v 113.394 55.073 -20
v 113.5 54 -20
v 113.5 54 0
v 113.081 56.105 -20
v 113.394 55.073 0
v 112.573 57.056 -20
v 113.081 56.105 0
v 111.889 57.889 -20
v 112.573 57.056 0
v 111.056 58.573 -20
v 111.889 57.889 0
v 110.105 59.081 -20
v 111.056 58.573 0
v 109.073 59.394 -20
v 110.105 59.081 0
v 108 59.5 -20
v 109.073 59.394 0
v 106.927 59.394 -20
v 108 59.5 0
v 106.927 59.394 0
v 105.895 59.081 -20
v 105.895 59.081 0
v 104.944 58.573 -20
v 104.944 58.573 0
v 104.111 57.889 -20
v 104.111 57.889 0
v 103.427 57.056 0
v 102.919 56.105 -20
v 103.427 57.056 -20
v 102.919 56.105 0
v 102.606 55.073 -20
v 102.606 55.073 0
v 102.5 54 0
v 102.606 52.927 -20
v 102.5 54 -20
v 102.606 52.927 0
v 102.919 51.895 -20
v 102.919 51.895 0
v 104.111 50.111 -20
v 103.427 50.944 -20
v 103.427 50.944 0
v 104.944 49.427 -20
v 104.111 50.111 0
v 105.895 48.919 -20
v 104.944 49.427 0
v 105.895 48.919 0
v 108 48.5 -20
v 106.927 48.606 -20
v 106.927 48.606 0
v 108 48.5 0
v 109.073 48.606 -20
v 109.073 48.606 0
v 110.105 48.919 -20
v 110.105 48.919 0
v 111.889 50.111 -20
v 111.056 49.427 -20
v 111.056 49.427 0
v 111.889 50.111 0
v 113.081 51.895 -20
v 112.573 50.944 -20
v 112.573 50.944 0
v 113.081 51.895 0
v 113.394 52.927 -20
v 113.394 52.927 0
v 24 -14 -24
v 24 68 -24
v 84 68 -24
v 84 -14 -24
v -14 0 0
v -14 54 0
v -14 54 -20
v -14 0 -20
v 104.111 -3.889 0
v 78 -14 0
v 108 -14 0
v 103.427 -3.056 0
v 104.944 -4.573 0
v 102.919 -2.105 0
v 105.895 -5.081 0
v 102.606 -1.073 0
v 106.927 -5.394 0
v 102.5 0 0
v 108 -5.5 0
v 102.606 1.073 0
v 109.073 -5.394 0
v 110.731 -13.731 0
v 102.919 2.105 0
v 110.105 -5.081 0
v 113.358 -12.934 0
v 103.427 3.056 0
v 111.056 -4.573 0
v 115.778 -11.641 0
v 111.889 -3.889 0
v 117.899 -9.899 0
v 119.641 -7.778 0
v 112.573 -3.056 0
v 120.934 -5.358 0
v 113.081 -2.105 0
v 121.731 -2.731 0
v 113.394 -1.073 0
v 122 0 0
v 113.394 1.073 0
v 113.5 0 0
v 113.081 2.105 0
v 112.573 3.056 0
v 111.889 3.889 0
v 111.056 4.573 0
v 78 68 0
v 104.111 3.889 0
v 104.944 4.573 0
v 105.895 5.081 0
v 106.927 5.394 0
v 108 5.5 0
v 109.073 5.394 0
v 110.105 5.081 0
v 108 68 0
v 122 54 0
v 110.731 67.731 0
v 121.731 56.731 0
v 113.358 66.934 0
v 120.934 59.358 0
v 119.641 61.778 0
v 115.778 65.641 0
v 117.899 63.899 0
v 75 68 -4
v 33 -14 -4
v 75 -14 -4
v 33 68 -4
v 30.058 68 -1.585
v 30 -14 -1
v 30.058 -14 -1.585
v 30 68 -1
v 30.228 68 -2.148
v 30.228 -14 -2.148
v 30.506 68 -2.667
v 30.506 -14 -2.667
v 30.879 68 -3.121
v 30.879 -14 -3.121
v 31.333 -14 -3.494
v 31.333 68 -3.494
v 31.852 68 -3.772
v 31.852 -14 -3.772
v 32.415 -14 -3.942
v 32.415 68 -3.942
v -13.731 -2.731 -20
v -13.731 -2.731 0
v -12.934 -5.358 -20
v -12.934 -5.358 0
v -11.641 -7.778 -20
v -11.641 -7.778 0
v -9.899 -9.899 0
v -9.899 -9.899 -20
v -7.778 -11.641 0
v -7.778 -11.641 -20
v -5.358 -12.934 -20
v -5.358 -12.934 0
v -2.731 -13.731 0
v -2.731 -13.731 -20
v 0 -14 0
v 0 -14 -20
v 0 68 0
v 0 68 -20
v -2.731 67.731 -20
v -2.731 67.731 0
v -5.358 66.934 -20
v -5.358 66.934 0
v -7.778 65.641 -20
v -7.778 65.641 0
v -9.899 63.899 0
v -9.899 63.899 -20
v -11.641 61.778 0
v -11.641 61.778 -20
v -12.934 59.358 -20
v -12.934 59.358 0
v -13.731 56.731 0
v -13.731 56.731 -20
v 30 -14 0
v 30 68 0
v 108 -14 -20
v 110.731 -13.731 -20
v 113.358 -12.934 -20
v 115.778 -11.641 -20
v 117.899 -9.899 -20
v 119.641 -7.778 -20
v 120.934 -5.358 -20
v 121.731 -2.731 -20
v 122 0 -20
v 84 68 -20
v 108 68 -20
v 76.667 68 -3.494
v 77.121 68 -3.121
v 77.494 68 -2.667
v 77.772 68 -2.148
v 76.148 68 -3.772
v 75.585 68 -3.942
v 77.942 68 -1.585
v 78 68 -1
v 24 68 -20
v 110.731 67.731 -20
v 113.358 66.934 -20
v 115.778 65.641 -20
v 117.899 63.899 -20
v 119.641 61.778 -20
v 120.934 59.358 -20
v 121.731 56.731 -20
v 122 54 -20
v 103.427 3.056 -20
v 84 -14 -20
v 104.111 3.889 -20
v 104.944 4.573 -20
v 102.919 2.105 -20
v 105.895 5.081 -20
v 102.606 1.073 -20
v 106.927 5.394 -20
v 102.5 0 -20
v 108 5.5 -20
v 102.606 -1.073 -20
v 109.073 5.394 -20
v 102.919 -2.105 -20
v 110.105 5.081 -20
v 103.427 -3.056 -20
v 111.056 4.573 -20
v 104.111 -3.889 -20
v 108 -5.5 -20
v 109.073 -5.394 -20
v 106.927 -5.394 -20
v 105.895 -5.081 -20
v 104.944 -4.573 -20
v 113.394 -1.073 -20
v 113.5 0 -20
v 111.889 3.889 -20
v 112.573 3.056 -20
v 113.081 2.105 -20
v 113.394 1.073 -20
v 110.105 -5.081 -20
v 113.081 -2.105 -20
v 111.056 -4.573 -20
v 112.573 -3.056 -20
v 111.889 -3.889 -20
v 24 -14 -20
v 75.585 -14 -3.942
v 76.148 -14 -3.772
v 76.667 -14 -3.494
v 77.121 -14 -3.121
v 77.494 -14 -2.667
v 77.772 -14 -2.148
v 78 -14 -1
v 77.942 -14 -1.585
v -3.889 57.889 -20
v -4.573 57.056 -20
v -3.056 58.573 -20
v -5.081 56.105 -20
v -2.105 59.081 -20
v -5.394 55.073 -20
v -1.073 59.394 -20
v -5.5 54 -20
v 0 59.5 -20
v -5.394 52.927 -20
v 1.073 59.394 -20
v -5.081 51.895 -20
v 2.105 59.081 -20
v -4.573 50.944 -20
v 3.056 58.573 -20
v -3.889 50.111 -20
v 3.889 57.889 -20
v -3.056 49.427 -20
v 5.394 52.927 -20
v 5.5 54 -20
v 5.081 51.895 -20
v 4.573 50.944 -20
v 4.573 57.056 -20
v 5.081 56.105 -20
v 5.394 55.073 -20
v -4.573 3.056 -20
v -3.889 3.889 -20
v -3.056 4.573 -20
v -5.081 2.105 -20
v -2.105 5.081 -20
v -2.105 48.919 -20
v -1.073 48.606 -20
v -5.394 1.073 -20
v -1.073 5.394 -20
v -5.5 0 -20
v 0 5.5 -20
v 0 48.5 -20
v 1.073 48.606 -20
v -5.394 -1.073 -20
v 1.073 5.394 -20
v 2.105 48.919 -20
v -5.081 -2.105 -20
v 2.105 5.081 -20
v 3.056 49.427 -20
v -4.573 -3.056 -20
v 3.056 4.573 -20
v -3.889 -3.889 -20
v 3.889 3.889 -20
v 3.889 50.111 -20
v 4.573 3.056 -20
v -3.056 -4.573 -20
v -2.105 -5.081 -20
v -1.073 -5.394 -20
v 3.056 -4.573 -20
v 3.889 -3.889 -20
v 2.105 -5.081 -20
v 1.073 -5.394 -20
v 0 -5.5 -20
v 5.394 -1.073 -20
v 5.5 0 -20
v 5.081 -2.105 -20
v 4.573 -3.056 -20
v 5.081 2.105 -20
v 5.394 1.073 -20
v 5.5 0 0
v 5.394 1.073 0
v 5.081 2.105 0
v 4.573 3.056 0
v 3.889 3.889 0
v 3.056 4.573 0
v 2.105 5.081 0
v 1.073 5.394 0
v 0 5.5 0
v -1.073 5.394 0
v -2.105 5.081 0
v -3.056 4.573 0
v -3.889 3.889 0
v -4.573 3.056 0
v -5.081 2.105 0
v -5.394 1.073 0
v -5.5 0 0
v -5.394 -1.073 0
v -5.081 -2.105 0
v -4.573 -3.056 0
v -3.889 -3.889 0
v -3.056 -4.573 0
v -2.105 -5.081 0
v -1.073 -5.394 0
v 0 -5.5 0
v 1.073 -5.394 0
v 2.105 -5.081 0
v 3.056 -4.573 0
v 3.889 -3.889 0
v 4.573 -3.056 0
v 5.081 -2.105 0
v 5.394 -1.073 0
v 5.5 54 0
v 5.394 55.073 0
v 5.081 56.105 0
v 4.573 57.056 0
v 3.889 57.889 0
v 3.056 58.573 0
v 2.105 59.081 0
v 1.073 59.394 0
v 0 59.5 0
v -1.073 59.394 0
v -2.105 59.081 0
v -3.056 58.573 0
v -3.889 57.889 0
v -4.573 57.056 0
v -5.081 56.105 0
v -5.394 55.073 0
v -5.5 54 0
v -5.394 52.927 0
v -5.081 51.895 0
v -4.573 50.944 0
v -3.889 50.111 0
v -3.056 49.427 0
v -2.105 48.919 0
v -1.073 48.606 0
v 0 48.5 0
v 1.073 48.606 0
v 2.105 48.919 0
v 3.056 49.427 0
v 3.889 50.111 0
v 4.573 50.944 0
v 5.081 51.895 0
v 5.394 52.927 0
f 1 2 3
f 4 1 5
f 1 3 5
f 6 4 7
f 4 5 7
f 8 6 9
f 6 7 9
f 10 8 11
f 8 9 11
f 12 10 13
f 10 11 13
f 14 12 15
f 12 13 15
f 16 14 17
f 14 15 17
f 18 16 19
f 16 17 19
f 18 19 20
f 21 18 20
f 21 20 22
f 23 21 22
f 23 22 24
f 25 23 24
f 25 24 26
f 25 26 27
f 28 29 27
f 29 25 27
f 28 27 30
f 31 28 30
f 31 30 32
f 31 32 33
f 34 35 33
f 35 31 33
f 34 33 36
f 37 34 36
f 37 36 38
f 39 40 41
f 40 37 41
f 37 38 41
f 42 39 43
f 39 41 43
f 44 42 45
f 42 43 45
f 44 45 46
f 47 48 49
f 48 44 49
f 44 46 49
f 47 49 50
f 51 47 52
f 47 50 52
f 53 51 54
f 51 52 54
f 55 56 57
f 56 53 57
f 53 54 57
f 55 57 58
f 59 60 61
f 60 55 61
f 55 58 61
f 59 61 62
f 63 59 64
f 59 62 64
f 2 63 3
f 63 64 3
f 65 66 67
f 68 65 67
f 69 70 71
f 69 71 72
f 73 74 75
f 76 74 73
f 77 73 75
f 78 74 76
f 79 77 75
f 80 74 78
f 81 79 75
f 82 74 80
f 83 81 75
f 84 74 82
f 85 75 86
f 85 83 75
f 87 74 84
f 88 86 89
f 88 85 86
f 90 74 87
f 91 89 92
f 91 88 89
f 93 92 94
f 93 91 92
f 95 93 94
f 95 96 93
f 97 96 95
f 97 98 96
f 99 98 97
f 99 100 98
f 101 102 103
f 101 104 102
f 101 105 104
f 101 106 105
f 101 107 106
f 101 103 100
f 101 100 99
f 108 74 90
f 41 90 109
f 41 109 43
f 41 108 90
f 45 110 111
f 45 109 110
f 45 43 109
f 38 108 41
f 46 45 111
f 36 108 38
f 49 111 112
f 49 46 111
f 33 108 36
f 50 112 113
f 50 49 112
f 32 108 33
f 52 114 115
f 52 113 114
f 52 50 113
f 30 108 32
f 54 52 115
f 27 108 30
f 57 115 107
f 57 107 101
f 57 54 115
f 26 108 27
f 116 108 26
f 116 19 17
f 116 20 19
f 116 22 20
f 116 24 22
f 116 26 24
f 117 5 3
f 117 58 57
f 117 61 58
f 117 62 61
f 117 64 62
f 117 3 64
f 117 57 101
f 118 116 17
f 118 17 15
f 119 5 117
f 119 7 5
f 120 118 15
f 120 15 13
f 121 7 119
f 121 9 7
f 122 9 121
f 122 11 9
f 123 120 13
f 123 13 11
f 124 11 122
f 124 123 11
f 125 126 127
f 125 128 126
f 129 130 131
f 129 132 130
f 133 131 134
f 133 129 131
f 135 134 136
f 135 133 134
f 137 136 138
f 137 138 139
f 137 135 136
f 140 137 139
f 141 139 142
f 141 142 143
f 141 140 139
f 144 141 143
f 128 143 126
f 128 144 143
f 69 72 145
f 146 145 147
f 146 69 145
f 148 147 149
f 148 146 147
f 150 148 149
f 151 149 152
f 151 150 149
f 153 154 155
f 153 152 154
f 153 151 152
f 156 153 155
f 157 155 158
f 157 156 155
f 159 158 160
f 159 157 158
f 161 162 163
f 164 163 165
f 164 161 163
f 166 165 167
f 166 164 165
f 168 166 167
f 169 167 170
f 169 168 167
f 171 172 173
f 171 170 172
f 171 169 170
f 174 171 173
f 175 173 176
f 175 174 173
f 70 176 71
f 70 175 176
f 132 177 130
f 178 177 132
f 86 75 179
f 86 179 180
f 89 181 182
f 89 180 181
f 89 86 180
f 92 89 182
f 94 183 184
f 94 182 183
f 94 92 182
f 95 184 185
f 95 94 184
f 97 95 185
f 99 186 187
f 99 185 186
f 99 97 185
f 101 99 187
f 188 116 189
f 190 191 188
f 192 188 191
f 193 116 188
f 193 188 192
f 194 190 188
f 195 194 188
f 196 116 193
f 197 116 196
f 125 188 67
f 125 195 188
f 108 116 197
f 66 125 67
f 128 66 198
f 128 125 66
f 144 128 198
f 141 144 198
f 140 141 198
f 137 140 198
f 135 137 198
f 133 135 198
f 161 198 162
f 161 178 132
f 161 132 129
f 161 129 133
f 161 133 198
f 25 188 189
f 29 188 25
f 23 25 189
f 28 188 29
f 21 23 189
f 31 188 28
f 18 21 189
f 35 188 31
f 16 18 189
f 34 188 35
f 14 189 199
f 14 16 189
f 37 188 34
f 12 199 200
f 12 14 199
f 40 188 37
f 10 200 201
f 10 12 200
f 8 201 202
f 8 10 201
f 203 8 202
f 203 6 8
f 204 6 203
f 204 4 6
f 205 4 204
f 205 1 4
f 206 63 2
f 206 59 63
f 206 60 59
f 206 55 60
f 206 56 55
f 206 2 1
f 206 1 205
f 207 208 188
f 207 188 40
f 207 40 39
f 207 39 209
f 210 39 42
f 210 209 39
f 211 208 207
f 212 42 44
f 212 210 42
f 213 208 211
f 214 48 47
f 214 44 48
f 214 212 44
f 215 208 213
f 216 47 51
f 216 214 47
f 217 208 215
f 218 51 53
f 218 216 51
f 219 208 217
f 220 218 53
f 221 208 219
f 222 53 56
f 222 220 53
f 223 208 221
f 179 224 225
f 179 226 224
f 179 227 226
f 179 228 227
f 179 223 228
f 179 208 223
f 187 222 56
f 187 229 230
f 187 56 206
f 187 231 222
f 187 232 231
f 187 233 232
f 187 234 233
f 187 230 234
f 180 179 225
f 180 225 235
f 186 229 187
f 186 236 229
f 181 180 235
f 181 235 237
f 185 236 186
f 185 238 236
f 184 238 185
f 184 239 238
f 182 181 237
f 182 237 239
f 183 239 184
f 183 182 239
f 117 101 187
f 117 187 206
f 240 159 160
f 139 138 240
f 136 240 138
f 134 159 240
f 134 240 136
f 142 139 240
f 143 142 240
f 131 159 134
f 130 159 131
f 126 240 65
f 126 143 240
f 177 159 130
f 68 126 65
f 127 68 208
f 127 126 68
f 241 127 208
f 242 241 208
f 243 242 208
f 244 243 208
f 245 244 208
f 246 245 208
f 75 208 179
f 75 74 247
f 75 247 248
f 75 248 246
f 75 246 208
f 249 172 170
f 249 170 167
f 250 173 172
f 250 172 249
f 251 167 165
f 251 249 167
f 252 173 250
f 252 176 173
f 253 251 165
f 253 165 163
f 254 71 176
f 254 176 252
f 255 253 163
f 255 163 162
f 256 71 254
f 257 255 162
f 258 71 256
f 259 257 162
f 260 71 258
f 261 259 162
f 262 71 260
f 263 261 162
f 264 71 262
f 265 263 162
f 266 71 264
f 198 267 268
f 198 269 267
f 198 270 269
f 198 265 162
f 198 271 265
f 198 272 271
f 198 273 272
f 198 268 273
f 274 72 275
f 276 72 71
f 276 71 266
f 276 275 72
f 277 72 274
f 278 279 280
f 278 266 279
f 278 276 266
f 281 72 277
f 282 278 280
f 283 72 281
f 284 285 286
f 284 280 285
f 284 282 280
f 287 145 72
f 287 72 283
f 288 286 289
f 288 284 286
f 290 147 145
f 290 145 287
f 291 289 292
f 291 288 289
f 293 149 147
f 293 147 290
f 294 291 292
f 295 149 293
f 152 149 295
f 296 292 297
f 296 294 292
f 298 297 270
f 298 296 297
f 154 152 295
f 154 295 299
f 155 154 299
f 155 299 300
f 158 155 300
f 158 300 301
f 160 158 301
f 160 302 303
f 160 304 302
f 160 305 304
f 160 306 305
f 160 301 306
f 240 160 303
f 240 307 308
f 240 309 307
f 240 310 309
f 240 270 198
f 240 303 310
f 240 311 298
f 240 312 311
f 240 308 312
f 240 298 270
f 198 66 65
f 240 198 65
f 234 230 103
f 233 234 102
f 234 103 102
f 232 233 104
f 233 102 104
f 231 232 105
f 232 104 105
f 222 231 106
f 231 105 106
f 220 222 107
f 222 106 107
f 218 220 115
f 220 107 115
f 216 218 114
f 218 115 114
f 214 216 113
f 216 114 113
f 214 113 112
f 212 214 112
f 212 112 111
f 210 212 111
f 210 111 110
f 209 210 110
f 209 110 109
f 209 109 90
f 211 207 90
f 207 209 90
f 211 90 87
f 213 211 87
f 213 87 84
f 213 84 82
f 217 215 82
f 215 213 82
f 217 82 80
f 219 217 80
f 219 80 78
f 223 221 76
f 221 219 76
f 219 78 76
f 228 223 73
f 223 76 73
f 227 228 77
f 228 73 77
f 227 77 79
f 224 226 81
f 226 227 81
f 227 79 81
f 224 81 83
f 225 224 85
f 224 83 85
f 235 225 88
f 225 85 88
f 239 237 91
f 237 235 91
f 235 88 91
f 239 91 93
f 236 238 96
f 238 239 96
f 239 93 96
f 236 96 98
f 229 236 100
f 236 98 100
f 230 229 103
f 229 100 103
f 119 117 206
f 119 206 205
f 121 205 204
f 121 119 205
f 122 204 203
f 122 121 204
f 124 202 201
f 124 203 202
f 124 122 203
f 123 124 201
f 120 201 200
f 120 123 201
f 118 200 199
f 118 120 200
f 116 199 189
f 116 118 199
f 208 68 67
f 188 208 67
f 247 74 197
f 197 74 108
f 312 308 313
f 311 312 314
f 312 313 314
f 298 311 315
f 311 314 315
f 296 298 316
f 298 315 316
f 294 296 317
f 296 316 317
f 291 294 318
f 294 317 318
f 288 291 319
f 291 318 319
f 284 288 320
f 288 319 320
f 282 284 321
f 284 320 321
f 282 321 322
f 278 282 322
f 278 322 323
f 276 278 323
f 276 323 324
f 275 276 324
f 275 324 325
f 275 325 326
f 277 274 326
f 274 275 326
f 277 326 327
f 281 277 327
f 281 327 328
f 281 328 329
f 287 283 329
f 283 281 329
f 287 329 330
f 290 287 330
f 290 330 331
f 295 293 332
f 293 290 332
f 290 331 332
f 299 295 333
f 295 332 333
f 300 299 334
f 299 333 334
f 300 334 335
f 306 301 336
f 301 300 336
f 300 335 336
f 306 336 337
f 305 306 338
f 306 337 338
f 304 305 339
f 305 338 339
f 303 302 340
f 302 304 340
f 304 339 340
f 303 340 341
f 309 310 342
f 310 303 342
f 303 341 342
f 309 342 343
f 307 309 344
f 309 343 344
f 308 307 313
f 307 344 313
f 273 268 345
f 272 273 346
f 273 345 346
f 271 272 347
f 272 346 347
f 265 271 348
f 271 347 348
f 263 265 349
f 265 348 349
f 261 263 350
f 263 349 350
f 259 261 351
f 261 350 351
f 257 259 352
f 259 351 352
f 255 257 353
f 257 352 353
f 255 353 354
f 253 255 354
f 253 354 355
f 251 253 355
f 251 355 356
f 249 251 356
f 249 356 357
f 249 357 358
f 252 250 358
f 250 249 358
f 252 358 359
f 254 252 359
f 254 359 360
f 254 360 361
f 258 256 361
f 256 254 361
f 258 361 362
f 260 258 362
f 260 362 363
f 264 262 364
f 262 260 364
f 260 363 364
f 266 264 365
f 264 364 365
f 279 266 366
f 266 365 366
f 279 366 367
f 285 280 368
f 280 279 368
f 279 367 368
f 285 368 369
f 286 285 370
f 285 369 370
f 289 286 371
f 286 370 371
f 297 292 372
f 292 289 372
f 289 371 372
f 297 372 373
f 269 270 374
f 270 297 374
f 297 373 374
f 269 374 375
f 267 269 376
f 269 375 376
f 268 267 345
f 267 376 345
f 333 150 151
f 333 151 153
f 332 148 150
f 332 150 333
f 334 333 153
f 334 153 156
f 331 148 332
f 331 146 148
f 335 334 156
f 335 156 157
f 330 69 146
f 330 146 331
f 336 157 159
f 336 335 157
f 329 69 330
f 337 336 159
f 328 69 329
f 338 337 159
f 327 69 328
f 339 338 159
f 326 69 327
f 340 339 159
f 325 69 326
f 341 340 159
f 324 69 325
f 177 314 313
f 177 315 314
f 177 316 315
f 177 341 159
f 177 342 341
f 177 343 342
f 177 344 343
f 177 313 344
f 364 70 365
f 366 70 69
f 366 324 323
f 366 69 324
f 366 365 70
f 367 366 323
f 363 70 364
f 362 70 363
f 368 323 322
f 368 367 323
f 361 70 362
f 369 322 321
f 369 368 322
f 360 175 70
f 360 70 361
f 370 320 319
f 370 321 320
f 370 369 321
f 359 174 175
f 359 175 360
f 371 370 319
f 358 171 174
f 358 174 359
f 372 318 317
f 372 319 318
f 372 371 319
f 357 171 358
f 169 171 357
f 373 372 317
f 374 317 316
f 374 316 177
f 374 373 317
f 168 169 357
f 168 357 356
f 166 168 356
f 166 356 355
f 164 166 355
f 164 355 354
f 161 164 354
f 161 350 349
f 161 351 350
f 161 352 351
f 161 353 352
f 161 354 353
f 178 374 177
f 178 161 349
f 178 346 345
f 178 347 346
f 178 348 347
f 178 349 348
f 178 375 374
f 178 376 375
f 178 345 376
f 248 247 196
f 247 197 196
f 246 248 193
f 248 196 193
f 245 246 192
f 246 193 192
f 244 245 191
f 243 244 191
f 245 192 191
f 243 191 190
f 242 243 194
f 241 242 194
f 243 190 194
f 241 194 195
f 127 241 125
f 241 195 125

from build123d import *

# Parameters (mm, degrees)
F0_R     = 5.5
F0_W     = 48
F0_H     = 82
F1_DEPTH = 24
F2_DEPTH = 4
F3_R     = 3
F4_R     = 5.5
F5_DEPTH = 4


with BuildPart() as f1:
    # F0 (on Top) → F1 (new body)
    with BuildSketch(Plane.XY):
        with BuildLine():
            Line((-14, 54), (-14, 0))
            ThreePointArc((-14, 0), (-9.899495, -9.899495), (0, -14))
            Line((0, -14), (30, -14))
            Line((30, -14), (30, 68))
            Line((30, 68), (0, 68))
            ThreePointArc((0, 68), (-9.899495, 63.899495), (-14, 54))
        make_face()
        Circle(F0_R, mode=Mode.SUBTRACT)
        with Locations((0, 54)):
            Circle(F0_R, mode=Mode.SUBTRACT)
        with Locations((54, 27)):
            Rectangle(F0_W, F0_H)
        with BuildLine():
            Line((78, 68), (78, -14))
            Line((78, -14), (108, -14))
            ThreePointArc((108, -14), (117.899495, -9.899495), (122, 0))
            Line((122, 0), (122, 54))
            ThreePointArc((122, 54), (117.899495, 63.899495), (108, 68))
            Line((108, 68), (78, 68))
        make_face()
        with Locations((108, 0)):
            Circle(F0_R, mode=Mode.SUBTRACT)
        with Locations((108, 54)):
            Circle(F0_R, mode=Mode.SUBTRACT)
    extrude(amount=-F1_DEPTH)

    # F0 (on Top) → F2 (cut)
    with BuildSketch(Plane.XY):
        with Locations((54, 27)):
            Rectangle(F0_W, F0_H)
    extrude(amount=-F2_DEPTH, mode=Mode.SUBTRACT)

    # F3
    f3_edges = [f1.edges().sort_by_distance(p)[0] for p in [
        (78, 27, -4),
        (30, 27, -4),
    ]]
    fillet(f3_edges, radius=F3_R)

    # F4 (on face) → F5 (cut)
    with BuildSketch(Plane(origin=(0, 0, -24), x_dir=(1, 0, 0), z_dir=(0, 0, -1))):
        with BuildLine():
            Line((24, -68), (24, 14))
            Line((24, 14), (0, 14))
            ThreePointArc((0, 14), (-9.899495, 9.899495), (-14, 0))
            Line((-14, 0), (-14, -54))
            ThreePointArc((-14, -54), (-9.899495, -63.899495), (0, -68))
            Line((0, -68), (24, -68))
        make_face()
        with Locations((0, -54)):
            Circle(F4_R, mode=Mode.SUBTRACT)
        Circle(F4_R, mode=Mode.SUBTRACT)
        with BuildLine():
            Line((108, 14), (84, 14))
            Line((84, 14), (84, -68))
            Line((84, -68), (108, -68))
            ThreePointArc((108, -68), (117.899495, -63.899495), (122, -54))
            Line((122, -54), (122, 0))
            ThreePointArc((122, 0), (117.899495, 9.899495), (108, 14))
        make_face()
        with Locations((108, -54)):
            Circle(F4_R, mode=Mode.SUBTRACT)
        with Locations((108, 0)):
            Circle(F4_R, mode=Mode.SUBTRACT)
    extrude(amount=-F5_DEPTH, mode=Mode.SUBTRACT)


solid = f1.part
